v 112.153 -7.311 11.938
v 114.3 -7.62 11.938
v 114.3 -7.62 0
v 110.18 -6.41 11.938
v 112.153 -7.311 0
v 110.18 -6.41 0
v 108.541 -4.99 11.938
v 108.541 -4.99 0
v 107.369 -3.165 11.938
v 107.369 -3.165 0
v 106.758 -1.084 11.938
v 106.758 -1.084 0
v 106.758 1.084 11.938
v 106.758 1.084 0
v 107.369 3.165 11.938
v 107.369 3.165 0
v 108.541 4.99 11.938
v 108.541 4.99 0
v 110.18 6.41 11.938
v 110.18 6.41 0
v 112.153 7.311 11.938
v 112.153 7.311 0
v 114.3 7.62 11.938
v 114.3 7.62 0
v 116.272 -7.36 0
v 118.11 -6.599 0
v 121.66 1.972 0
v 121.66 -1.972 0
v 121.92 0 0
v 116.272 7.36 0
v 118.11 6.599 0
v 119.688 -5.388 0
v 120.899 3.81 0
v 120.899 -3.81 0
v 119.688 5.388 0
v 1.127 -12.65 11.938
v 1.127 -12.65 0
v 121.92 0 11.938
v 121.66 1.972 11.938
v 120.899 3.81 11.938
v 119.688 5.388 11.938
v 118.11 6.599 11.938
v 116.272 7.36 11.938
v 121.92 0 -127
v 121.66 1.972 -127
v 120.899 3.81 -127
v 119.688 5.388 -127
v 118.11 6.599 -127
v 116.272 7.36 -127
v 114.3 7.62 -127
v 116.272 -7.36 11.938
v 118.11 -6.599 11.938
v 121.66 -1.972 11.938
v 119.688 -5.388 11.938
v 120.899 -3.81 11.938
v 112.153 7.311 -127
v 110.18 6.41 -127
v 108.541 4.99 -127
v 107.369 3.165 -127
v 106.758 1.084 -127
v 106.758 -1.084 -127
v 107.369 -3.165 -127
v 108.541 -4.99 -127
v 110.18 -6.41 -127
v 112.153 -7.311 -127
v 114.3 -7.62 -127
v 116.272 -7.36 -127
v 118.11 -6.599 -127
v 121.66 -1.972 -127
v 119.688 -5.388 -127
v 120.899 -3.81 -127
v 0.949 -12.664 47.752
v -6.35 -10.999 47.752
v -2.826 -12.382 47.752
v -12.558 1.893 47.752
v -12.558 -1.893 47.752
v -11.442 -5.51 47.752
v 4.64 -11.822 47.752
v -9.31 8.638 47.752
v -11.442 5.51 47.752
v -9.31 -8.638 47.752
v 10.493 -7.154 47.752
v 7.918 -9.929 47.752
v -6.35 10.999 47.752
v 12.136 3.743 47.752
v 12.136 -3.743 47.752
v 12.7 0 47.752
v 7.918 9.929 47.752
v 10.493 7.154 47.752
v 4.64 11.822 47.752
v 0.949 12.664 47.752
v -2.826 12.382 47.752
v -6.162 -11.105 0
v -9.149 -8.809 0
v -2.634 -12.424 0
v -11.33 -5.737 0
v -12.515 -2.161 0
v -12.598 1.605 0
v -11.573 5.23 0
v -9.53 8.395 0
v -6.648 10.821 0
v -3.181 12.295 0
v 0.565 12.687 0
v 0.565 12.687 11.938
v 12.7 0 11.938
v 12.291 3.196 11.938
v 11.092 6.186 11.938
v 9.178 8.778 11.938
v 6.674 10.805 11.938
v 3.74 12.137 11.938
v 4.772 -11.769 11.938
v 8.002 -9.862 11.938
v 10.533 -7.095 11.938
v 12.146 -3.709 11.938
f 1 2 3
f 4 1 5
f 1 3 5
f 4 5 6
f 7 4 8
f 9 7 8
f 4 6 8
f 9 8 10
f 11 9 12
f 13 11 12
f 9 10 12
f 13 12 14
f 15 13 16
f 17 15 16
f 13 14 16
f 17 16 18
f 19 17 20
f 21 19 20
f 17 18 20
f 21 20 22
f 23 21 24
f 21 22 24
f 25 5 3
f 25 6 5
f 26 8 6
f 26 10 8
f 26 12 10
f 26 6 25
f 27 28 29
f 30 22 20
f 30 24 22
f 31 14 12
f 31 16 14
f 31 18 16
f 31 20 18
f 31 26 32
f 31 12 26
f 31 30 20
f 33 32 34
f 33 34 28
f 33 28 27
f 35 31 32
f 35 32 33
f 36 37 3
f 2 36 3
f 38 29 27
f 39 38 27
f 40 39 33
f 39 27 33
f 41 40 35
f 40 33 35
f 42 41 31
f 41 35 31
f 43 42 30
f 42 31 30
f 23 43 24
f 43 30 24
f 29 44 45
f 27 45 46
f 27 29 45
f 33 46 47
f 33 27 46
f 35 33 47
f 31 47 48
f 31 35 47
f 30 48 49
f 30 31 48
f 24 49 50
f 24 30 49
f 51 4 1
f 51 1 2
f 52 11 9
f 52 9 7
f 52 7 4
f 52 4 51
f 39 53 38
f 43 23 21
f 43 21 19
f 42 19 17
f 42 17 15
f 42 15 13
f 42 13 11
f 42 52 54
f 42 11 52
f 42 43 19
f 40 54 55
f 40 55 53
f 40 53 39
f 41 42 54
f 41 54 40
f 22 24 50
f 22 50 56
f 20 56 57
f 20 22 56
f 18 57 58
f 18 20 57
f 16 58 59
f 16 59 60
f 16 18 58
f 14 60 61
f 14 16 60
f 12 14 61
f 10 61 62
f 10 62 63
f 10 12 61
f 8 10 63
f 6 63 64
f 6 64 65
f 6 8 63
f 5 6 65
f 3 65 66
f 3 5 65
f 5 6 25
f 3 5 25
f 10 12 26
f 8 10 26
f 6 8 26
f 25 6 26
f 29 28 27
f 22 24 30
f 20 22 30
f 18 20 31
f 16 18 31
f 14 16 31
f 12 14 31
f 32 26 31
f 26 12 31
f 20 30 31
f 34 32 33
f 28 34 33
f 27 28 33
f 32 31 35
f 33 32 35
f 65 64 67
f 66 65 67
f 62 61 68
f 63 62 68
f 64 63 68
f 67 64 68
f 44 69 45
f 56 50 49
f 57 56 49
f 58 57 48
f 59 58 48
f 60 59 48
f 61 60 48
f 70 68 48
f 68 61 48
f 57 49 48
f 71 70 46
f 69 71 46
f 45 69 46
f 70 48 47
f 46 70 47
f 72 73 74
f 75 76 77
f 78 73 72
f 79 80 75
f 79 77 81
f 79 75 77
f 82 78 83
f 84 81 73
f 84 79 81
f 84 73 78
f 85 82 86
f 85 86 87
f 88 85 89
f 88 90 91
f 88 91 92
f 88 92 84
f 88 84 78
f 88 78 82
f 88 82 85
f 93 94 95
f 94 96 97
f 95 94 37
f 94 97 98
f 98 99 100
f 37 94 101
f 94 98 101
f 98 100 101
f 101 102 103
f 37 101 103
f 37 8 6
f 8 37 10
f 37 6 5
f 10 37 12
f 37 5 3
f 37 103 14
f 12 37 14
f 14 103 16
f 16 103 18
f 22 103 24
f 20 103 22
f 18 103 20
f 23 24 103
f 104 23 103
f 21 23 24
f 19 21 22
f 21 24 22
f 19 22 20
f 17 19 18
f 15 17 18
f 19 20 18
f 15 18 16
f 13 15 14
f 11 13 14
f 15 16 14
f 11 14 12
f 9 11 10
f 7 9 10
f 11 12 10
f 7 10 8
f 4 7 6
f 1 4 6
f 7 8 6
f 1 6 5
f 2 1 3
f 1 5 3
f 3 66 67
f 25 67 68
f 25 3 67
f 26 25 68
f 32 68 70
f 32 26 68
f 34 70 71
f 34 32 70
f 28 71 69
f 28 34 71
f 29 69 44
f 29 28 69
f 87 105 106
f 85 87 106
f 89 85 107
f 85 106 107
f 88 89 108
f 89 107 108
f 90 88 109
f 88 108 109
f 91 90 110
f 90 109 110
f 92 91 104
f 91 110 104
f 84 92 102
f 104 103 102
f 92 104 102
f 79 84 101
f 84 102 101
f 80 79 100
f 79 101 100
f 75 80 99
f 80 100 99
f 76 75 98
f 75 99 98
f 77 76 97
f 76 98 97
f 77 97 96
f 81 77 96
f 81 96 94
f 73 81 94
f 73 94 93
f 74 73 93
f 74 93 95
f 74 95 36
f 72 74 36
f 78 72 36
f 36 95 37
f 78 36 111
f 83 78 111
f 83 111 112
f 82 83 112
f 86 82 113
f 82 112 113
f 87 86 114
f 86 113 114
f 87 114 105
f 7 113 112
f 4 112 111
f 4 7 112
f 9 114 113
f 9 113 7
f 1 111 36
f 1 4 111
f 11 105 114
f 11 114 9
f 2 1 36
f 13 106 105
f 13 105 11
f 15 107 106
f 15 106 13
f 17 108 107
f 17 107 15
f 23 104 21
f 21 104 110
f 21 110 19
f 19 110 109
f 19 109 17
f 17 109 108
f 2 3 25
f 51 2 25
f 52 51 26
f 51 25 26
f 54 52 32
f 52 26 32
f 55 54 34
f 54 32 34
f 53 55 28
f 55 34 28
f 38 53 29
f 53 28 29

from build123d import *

# Parameters (mm, degrees)
F0_R     = 12.7
F1_DEPTH = 47.752
F3_DEPTH = 11.938
F4_DEPTH = 127
F5_DEPTH = 11.938
F6_DEPTH = 11.938


with BuildPart() as f1:
    # F0 (on Top) → F1 (new body)
    with BuildSketch(Plane.XY):
        Circle(F0_R)
    extrude(amount=F1_DEPTH)

    # F2 (on Top) → F3 (join)
    with BuildSketch(Plane.XY):
        with BuildLine():
            ThreePointArc((0.5652835213, 12.6874132328), (9.1779382413, 8.7781233552), (12.7, 0))
            ThreePointArc((12.7, 0), (9.3701287328, -8.5726709683), (1.126663381, -12.649926072))
            Line((1.126663381, -12.649926072), (114.3, -7.62))
            ThreePointArc((114.3, -7.62), (106.68, 0), (114.3, 7.62))
            Line((114.3, 7.62), (0.5652835213, 12.6874132328))
        make_face()
    extrude(amount=F3_DEPTH)

    # F2 (on Top) → F4 (join)
    with BuildSketch(Plane.XY):
        with BuildLine():
            ThreePointArc((121.92, 0), (119.6881536726, 5.3881536726), (114.3, 7.62))
            ThreePointArc((114.3, 7.62), (106.68, 0), (114.3, -7.62))
            ThreePointArc((114.3, -7.62), (119.6881536726, -5.3881536726), (121.92, 0))
        make_face()
    extrude(amount=-F4_DEPTH)

    # F2 (on Top) → F5 (cut)
    with BuildSketch(Plane.XY):
        with BuildLine():
            ThreePointArc((121.92, 0), (119.6881536726, 5.3881536726), (114.3, 7.62))
            ThreePointArc((114.3, 7.62), (106.68, 0), (114.3, -7.62))
            ThreePointArc((114.3, -7.62), (119.6881536726, -5.3881536726), (121.92, 0))
        make_face()
    extrude(amount=F5_DEPTH, mode=Mode.SUBTRACT)


with BuildPart() as f6:
    # F2 (on Top) → F6 (new body)
    with BuildSketch(Plane.XY):
        with BuildLine():
            ThreePointArc((121.92, 0), (119.6881536726, 5.3881536726), (114.3, 7.62))
            ThreePointArc((114.3, 7.62), (106.68, 0), (114.3, -7.62))
            ThreePointArc((114.3, -7.62), (119.6881536726, -5.3881536726), (121.92, 0))
        make_face()
    extrude(amount=F6_DEPTH)


solid = Compound([f1.part, f6.part])
